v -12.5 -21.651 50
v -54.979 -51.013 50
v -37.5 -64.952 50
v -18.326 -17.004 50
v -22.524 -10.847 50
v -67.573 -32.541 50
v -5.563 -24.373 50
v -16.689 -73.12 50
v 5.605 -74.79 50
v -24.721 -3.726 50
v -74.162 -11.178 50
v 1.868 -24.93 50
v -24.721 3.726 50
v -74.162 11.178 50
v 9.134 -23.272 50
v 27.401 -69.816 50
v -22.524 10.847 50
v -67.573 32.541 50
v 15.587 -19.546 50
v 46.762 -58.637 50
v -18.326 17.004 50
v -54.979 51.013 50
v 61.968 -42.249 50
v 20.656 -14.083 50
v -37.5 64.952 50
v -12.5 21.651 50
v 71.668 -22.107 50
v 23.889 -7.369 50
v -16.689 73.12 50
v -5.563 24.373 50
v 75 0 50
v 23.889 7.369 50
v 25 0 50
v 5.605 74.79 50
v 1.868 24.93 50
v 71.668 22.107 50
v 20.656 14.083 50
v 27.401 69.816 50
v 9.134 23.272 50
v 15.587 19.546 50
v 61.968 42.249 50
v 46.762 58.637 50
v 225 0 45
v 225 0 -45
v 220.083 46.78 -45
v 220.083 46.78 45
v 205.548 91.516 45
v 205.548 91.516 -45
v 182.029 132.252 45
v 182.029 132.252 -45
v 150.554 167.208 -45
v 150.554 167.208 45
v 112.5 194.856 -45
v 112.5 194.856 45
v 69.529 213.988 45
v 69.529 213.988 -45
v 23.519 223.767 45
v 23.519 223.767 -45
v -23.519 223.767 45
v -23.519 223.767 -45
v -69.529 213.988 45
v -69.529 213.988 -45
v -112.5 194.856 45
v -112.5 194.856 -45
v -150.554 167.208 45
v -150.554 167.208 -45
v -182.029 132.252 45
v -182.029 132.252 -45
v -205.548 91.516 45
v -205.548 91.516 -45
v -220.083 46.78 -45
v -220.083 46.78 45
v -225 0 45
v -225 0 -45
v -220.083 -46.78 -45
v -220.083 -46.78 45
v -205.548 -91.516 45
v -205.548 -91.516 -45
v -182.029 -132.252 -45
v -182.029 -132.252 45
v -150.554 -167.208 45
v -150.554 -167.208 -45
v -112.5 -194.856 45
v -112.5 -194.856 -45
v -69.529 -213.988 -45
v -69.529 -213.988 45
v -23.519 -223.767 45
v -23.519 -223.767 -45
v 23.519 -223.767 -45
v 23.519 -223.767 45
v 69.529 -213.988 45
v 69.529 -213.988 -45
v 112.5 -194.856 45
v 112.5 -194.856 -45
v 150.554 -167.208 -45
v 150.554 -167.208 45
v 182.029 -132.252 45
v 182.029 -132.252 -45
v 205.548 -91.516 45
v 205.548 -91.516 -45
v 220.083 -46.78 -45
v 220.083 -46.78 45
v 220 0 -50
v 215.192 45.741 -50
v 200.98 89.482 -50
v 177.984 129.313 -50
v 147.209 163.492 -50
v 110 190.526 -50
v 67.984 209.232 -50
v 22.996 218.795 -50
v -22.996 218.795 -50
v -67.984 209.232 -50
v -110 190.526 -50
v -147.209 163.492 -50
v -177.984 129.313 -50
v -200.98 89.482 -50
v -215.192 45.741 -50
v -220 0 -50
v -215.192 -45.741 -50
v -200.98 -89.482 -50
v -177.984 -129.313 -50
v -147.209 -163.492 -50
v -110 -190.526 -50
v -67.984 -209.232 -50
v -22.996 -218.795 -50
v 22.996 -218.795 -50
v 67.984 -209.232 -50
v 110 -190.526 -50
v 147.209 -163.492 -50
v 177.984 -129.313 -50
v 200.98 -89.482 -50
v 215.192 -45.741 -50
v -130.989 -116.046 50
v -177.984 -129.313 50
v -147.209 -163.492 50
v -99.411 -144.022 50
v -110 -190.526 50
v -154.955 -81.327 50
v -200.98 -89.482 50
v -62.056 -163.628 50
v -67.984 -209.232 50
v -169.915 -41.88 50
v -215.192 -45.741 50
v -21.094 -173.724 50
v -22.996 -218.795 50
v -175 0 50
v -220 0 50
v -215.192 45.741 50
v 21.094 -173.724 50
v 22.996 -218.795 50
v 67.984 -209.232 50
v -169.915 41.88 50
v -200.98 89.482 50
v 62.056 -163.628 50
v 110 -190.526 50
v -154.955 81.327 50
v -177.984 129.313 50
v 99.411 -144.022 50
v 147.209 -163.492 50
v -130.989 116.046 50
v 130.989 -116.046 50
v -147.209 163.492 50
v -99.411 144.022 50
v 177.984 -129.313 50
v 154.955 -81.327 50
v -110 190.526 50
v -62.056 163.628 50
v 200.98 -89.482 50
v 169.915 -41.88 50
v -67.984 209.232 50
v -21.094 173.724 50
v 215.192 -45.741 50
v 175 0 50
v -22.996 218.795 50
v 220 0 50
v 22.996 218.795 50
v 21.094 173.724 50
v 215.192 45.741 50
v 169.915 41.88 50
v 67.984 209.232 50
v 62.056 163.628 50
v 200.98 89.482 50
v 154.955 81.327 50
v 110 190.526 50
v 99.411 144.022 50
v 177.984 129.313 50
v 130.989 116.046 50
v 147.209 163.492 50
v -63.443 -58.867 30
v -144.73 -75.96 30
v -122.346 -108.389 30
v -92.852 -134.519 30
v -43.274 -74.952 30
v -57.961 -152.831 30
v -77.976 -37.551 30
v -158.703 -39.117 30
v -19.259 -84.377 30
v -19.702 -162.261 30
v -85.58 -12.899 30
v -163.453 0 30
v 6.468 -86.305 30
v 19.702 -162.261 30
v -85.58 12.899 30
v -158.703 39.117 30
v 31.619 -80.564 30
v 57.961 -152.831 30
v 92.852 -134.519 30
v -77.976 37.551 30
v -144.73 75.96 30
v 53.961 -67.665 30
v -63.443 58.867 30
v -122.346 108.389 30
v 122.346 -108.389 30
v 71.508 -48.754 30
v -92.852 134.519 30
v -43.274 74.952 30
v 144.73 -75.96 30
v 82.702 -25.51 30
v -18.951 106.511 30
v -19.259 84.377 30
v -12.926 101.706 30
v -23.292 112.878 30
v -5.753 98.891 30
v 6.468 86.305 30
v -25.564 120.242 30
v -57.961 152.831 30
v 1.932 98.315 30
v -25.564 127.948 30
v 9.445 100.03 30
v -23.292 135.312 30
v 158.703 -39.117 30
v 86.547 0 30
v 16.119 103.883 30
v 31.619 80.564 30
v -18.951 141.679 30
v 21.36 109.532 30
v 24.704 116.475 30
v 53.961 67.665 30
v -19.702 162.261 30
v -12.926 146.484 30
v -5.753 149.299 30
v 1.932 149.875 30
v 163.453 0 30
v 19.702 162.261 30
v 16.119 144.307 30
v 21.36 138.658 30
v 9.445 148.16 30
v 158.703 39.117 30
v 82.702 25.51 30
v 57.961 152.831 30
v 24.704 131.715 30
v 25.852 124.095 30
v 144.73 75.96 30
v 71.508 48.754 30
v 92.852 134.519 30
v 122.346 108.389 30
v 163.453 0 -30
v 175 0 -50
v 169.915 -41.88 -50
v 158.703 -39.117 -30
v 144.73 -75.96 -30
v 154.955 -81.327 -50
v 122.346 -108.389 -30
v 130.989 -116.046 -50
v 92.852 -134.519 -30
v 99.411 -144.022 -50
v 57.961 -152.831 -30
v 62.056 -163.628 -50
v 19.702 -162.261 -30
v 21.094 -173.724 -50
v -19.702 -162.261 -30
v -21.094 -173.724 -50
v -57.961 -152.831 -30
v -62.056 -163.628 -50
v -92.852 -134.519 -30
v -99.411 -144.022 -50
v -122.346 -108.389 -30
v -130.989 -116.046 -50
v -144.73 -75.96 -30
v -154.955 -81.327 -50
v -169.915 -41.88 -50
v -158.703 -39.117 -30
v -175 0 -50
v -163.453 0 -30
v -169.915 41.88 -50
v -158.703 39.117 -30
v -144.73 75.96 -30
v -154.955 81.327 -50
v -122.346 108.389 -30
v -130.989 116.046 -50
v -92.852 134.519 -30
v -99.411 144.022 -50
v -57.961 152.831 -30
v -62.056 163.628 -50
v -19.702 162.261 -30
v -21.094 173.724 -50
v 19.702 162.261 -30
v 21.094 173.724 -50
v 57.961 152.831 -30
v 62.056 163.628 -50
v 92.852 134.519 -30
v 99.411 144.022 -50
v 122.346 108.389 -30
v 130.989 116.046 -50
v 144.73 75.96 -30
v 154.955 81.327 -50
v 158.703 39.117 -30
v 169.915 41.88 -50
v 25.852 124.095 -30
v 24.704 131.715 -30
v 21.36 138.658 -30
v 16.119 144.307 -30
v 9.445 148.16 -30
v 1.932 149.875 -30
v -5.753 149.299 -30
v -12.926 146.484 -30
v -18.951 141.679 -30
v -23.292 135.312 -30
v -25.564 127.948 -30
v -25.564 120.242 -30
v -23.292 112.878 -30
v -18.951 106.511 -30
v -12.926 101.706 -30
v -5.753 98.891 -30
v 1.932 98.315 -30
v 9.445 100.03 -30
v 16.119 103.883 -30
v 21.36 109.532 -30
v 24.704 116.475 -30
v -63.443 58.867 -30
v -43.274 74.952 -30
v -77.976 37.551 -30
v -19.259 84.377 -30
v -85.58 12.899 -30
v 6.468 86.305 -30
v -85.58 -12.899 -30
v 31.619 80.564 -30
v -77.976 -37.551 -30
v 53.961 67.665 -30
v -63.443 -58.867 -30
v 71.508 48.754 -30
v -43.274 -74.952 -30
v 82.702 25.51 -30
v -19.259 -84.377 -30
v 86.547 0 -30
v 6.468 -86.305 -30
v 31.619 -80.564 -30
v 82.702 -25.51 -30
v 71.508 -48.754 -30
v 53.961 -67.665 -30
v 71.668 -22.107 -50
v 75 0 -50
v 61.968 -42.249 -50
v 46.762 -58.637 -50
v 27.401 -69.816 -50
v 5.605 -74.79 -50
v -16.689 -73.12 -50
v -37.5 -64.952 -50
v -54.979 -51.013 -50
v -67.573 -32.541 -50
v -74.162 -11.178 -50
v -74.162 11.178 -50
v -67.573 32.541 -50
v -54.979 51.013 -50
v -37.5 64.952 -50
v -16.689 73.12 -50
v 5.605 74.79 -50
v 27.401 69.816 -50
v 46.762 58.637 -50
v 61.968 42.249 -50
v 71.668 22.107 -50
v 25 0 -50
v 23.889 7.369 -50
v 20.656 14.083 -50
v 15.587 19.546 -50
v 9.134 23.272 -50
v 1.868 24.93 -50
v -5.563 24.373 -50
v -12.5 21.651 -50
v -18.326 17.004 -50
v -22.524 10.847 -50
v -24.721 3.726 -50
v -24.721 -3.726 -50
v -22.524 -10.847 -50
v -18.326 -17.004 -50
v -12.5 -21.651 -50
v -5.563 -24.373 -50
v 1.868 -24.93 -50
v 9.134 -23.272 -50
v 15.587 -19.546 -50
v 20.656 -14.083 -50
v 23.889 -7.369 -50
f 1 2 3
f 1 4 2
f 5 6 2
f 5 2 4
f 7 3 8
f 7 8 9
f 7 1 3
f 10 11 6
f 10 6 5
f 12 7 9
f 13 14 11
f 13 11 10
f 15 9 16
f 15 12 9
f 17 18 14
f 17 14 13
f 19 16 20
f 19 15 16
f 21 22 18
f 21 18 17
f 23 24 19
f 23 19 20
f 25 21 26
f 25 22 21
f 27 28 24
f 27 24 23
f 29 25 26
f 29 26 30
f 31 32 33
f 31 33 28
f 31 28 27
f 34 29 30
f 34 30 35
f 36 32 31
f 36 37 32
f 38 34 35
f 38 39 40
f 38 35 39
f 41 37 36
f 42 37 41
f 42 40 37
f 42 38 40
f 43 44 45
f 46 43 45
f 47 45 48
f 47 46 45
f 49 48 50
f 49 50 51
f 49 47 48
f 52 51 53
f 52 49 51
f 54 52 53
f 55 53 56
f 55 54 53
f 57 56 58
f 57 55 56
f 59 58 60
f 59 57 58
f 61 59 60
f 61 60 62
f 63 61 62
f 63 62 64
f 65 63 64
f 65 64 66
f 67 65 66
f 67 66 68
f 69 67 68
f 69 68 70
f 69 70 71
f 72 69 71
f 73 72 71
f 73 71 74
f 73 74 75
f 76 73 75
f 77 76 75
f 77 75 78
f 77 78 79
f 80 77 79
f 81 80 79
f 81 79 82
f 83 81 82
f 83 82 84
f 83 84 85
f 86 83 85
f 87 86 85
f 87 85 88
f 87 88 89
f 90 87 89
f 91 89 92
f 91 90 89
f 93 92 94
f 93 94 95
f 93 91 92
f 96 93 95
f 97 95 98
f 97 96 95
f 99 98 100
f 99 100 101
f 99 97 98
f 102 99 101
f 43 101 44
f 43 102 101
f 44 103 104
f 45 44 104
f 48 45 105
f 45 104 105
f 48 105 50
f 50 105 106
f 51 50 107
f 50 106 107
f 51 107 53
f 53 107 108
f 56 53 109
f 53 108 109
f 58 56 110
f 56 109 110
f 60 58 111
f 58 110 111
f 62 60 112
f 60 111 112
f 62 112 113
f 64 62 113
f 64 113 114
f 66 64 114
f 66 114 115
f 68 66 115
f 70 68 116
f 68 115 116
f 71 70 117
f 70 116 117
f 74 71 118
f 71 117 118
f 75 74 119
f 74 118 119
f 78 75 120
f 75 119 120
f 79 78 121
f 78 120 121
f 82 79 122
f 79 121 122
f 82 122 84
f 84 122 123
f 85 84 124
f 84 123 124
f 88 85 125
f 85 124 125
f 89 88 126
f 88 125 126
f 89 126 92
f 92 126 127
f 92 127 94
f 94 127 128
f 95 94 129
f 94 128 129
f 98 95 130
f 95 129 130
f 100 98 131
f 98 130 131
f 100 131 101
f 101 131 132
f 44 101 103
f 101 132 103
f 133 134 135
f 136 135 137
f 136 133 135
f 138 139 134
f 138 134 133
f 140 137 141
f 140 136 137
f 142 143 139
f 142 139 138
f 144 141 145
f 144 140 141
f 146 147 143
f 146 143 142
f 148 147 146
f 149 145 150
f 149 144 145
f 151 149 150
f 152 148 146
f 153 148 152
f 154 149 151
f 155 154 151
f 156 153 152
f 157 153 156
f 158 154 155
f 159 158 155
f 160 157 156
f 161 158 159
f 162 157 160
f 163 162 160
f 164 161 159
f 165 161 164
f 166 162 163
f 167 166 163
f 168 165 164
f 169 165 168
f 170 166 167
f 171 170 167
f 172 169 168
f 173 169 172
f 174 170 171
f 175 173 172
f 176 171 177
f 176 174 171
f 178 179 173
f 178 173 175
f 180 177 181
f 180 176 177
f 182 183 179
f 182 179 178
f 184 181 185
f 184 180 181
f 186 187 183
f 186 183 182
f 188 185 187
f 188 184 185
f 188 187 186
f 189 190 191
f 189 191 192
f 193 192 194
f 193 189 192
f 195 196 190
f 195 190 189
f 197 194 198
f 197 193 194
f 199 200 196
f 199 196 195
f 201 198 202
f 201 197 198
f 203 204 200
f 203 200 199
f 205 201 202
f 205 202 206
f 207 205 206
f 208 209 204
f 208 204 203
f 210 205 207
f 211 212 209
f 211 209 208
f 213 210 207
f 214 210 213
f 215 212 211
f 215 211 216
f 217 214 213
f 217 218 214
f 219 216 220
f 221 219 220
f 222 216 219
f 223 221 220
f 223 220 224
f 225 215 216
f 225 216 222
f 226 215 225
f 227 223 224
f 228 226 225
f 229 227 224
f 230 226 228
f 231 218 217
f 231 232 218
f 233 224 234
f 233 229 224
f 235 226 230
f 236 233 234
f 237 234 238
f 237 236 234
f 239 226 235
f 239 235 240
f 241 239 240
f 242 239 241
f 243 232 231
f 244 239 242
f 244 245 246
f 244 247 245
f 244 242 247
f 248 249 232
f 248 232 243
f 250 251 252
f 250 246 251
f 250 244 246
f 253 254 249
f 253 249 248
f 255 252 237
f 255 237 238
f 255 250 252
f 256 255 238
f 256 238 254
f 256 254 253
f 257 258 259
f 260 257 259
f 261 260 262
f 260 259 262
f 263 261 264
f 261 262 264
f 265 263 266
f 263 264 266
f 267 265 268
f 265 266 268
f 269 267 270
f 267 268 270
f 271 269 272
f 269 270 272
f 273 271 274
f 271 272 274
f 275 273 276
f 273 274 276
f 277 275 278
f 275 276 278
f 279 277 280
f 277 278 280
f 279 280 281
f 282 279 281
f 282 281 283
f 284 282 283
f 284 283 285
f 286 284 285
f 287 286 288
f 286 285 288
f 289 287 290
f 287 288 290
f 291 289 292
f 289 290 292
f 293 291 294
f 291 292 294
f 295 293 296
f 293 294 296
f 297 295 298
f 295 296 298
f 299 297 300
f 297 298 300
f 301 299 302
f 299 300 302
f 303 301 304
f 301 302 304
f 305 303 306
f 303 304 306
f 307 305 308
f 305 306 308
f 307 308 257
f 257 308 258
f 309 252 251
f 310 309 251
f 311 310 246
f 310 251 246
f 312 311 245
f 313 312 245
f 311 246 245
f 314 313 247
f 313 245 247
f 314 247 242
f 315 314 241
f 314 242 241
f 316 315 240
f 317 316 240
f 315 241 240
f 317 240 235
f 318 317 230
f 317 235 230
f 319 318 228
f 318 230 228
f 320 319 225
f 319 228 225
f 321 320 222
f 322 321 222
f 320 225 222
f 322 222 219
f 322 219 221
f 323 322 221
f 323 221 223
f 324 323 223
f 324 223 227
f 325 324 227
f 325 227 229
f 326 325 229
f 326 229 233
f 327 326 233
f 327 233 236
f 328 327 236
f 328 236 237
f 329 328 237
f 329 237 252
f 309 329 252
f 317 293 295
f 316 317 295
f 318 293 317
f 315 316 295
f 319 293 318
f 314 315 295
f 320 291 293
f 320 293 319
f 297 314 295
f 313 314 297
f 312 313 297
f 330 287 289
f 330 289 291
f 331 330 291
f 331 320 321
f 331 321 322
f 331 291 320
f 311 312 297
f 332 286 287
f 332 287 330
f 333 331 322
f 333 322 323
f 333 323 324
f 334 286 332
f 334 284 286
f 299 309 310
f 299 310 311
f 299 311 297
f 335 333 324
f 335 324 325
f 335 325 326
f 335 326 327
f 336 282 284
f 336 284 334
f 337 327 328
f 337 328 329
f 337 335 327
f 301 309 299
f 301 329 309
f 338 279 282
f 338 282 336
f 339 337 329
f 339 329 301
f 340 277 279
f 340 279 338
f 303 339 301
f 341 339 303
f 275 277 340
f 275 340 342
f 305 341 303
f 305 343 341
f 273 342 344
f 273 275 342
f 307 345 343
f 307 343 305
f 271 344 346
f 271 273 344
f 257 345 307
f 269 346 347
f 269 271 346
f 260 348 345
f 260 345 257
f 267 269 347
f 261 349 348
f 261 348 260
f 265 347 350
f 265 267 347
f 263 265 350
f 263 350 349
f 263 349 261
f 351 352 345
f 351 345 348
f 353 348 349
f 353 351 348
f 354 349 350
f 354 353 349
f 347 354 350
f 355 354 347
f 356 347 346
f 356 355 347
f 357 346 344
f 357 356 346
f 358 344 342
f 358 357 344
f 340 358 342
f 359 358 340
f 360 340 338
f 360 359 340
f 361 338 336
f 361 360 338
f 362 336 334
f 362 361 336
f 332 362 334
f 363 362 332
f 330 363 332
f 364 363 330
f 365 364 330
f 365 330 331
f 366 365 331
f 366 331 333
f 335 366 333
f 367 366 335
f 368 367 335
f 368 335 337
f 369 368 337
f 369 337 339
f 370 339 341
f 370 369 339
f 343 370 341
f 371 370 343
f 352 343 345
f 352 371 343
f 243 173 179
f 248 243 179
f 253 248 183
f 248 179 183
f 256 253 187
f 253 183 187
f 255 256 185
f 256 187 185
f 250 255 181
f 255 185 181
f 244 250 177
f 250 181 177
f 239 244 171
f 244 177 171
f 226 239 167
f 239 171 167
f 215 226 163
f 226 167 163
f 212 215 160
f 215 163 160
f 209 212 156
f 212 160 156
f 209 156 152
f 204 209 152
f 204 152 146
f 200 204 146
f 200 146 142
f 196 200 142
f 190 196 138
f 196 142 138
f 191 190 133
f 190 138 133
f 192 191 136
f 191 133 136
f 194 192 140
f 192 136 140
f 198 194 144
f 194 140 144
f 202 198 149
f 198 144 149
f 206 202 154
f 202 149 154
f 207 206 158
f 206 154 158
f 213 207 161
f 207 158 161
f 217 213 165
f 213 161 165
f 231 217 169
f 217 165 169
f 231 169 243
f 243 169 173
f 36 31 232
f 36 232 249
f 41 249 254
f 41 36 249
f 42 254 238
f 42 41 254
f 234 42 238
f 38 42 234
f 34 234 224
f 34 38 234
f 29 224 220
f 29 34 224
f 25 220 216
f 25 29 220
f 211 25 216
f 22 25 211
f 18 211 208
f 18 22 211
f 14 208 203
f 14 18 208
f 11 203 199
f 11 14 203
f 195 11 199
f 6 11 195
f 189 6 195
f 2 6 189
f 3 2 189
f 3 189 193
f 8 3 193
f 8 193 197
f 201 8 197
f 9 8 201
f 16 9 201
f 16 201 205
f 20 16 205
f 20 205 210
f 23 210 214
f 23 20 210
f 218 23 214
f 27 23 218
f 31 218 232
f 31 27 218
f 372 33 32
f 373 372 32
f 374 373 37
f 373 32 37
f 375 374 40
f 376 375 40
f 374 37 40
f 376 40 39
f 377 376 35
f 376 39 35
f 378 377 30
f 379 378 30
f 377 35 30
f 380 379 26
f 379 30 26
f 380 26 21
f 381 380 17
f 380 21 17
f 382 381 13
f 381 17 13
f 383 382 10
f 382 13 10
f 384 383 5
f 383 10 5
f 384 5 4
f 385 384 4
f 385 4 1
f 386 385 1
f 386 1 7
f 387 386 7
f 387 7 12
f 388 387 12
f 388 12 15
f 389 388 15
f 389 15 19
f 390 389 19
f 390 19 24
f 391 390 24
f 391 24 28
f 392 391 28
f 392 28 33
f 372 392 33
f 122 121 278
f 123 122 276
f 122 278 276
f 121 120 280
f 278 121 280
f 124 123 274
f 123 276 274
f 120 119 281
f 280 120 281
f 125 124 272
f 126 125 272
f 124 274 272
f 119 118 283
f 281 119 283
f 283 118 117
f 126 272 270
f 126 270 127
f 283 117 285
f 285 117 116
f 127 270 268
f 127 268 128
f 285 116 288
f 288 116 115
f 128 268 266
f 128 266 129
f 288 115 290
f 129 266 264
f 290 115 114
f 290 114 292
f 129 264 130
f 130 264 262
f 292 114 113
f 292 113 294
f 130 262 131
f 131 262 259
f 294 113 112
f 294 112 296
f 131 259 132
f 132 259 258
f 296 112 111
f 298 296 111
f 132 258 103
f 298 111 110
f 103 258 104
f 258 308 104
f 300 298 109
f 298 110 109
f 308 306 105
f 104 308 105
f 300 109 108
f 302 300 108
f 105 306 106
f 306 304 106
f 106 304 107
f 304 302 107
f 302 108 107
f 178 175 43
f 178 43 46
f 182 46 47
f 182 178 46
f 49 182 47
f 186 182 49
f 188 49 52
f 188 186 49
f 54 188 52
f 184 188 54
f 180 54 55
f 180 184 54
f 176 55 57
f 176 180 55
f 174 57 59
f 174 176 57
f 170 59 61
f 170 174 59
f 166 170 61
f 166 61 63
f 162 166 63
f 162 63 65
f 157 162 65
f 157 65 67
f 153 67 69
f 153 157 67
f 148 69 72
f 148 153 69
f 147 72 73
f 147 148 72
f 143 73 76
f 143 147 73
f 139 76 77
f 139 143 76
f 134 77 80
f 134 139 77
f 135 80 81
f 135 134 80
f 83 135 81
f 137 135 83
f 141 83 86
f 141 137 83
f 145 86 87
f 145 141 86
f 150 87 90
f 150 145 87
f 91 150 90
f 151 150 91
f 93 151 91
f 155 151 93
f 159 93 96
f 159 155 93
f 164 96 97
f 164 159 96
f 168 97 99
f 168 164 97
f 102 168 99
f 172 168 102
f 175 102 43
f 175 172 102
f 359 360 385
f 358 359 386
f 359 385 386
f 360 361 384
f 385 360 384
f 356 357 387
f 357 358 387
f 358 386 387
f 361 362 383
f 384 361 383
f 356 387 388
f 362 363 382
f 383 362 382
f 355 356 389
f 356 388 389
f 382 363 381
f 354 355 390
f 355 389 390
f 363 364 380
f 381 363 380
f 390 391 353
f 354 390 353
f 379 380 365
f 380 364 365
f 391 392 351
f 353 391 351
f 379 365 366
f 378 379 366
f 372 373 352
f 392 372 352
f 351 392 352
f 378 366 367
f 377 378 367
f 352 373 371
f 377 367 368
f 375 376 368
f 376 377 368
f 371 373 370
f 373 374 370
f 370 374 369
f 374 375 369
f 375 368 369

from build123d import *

# Parameters (mm, degrees)
SKETCH_1_R                 = 225
EXTRUDE_1_DEPTH            = 50
SKETCH_2_R                 = 25
CUT_EXTRUDE_1_DEPTH        = 334.541601603
SKETCH_3_R                 = 175
SKETCH_3_R_2               = 75
CUT_EXTRUDE_3_DEPTH        = 20
CUT_EXTRUDE_3_DRAFT        = -30
MIRROR_1_COPY_1_SKETCH_R   = 175
MIRROR_1_COPY_1_SKETCH_R_2 = 75
MIRROR_1_COPY_1_DEPTH      = 20
MIRROR_1_COPY_1_DRAFT      = -30
CHAMFER_1_SIZE             = 5
SKETCH_4_R                 = 25.852351377
CUT_EXTRUDE_4_DEPTH        = 329.10059433


with BuildPart() as part:
    # 草图1 → 凸台-拉伸1 (new, symmetric)
    with BuildSketch(Plane.XY):
        Circle(SKETCH_1_R)
    extrude(amount=EXTRUDE_1_DEPTH, both=True)

    # 草图2 → 切除-拉伸1 (cut, through all)
    with BuildSketch(Plane.XY.offset(50)):
        Circle(SKETCH_2_R)
    extrude(amount=-CUT_EXTRUDE_1_DEPTH, mode=Mode.SUBTRACT)


with BuildPart() as cut_extrude_3_tool:
    # 草图3 → 切除-拉伸3 (with draft: the straight prism first)
    with BuildSketch(Plane.XY.offset(50)):
        Circle(SKETCH_3_R)
        Circle(SKETCH_3_R_2, mode=Mode.SUBTRACT)
    extrude(amount=-CUT_EXTRUDE_3_DEPTH)
    # 切除-拉伸3: the draft: its side faces are tilted about the plane it starts from
    cut_extrude_3_sides = [cut_extrude_3_tool.faces().sort_by_distance(p)[0] for p in [
        (-175, 0, 40),
        (-75, 0, 40),
    ]]
    draft(cut_extrude_3_sides, Plane.XY.offset(50), CUT_EXTRUDE_3_DRAFT)


with BuildPart() as part_1:
    add(part.part)

    # 切除-拉伸3: cut by cut_extrude_3_tool
    add(cut_extrude_3_tool.part, mode=Mode.SUBTRACT)


with BuildPart() as mirror_1_copy_1_tool:
    # 镜向1 copy 1 sketch → 镜向1 copy 1 (with draft: the straight prism first)
    with BuildSketch(Plane(origin=(0, 0, -50), x_dir=(1, 0, 0), z_dir=(0, 0, -1))):
        Circle(MIRROR_1_COPY_1_SKETCH_R)
        Circle(MIRROR_1_COPY_1_SKETCH_R_2, mode=Mode.SUBTRACT)
    extrude(amount=-MIRROR_1_COPY_1_DEPTH)
    # 镜向1 copy 1: the draft: its side faces are tilted about the plane it starts from
    mirror_1_copy_1_sides = [mirror_1_copy_1_tool.faces().sort_by_distance(p)[0] for p in [
        (-175, 0, -40),
        (-75, 0, -40),
    ]]
    draft(mirror_1_copy_1_sides, Plane(origin=(0, 0, -50), x_dir=(1, 0, 0), z_dir=(0, 0, -1)), MIRROR_1_COPY_1_DRAFT)


with BuildPart() as part_2:
    add(part_1.part)

    # 镜向1 copy 1: cut by mirror_1_copy_1_tool
    add(mirror_1_copy_1_tool.part, mode=Mode.SUBTRACT)

    # 倒角1
    chamfer_1_edges = [part_2.edges().sort_by_distance(p)[0] for p in [
        (-225, 0, -50),
        (-225, 0, 50),
    ]]
    chamfer(chamfer_1_edges, length=CHAMFER_1_SIZE)

    # 草图4 → 切除-拉伸4 (cut, through all)
    with BuildSketch(Plane.XY.offset(30)):
        with Locations((0, 124.095015256)):
            Circle(SKETCH_4_R)
    extrude(amount=-CUT_EXTRUDE_4_DEPTH, mode=Mode.SUBTRACT)


solid = part_2.part
